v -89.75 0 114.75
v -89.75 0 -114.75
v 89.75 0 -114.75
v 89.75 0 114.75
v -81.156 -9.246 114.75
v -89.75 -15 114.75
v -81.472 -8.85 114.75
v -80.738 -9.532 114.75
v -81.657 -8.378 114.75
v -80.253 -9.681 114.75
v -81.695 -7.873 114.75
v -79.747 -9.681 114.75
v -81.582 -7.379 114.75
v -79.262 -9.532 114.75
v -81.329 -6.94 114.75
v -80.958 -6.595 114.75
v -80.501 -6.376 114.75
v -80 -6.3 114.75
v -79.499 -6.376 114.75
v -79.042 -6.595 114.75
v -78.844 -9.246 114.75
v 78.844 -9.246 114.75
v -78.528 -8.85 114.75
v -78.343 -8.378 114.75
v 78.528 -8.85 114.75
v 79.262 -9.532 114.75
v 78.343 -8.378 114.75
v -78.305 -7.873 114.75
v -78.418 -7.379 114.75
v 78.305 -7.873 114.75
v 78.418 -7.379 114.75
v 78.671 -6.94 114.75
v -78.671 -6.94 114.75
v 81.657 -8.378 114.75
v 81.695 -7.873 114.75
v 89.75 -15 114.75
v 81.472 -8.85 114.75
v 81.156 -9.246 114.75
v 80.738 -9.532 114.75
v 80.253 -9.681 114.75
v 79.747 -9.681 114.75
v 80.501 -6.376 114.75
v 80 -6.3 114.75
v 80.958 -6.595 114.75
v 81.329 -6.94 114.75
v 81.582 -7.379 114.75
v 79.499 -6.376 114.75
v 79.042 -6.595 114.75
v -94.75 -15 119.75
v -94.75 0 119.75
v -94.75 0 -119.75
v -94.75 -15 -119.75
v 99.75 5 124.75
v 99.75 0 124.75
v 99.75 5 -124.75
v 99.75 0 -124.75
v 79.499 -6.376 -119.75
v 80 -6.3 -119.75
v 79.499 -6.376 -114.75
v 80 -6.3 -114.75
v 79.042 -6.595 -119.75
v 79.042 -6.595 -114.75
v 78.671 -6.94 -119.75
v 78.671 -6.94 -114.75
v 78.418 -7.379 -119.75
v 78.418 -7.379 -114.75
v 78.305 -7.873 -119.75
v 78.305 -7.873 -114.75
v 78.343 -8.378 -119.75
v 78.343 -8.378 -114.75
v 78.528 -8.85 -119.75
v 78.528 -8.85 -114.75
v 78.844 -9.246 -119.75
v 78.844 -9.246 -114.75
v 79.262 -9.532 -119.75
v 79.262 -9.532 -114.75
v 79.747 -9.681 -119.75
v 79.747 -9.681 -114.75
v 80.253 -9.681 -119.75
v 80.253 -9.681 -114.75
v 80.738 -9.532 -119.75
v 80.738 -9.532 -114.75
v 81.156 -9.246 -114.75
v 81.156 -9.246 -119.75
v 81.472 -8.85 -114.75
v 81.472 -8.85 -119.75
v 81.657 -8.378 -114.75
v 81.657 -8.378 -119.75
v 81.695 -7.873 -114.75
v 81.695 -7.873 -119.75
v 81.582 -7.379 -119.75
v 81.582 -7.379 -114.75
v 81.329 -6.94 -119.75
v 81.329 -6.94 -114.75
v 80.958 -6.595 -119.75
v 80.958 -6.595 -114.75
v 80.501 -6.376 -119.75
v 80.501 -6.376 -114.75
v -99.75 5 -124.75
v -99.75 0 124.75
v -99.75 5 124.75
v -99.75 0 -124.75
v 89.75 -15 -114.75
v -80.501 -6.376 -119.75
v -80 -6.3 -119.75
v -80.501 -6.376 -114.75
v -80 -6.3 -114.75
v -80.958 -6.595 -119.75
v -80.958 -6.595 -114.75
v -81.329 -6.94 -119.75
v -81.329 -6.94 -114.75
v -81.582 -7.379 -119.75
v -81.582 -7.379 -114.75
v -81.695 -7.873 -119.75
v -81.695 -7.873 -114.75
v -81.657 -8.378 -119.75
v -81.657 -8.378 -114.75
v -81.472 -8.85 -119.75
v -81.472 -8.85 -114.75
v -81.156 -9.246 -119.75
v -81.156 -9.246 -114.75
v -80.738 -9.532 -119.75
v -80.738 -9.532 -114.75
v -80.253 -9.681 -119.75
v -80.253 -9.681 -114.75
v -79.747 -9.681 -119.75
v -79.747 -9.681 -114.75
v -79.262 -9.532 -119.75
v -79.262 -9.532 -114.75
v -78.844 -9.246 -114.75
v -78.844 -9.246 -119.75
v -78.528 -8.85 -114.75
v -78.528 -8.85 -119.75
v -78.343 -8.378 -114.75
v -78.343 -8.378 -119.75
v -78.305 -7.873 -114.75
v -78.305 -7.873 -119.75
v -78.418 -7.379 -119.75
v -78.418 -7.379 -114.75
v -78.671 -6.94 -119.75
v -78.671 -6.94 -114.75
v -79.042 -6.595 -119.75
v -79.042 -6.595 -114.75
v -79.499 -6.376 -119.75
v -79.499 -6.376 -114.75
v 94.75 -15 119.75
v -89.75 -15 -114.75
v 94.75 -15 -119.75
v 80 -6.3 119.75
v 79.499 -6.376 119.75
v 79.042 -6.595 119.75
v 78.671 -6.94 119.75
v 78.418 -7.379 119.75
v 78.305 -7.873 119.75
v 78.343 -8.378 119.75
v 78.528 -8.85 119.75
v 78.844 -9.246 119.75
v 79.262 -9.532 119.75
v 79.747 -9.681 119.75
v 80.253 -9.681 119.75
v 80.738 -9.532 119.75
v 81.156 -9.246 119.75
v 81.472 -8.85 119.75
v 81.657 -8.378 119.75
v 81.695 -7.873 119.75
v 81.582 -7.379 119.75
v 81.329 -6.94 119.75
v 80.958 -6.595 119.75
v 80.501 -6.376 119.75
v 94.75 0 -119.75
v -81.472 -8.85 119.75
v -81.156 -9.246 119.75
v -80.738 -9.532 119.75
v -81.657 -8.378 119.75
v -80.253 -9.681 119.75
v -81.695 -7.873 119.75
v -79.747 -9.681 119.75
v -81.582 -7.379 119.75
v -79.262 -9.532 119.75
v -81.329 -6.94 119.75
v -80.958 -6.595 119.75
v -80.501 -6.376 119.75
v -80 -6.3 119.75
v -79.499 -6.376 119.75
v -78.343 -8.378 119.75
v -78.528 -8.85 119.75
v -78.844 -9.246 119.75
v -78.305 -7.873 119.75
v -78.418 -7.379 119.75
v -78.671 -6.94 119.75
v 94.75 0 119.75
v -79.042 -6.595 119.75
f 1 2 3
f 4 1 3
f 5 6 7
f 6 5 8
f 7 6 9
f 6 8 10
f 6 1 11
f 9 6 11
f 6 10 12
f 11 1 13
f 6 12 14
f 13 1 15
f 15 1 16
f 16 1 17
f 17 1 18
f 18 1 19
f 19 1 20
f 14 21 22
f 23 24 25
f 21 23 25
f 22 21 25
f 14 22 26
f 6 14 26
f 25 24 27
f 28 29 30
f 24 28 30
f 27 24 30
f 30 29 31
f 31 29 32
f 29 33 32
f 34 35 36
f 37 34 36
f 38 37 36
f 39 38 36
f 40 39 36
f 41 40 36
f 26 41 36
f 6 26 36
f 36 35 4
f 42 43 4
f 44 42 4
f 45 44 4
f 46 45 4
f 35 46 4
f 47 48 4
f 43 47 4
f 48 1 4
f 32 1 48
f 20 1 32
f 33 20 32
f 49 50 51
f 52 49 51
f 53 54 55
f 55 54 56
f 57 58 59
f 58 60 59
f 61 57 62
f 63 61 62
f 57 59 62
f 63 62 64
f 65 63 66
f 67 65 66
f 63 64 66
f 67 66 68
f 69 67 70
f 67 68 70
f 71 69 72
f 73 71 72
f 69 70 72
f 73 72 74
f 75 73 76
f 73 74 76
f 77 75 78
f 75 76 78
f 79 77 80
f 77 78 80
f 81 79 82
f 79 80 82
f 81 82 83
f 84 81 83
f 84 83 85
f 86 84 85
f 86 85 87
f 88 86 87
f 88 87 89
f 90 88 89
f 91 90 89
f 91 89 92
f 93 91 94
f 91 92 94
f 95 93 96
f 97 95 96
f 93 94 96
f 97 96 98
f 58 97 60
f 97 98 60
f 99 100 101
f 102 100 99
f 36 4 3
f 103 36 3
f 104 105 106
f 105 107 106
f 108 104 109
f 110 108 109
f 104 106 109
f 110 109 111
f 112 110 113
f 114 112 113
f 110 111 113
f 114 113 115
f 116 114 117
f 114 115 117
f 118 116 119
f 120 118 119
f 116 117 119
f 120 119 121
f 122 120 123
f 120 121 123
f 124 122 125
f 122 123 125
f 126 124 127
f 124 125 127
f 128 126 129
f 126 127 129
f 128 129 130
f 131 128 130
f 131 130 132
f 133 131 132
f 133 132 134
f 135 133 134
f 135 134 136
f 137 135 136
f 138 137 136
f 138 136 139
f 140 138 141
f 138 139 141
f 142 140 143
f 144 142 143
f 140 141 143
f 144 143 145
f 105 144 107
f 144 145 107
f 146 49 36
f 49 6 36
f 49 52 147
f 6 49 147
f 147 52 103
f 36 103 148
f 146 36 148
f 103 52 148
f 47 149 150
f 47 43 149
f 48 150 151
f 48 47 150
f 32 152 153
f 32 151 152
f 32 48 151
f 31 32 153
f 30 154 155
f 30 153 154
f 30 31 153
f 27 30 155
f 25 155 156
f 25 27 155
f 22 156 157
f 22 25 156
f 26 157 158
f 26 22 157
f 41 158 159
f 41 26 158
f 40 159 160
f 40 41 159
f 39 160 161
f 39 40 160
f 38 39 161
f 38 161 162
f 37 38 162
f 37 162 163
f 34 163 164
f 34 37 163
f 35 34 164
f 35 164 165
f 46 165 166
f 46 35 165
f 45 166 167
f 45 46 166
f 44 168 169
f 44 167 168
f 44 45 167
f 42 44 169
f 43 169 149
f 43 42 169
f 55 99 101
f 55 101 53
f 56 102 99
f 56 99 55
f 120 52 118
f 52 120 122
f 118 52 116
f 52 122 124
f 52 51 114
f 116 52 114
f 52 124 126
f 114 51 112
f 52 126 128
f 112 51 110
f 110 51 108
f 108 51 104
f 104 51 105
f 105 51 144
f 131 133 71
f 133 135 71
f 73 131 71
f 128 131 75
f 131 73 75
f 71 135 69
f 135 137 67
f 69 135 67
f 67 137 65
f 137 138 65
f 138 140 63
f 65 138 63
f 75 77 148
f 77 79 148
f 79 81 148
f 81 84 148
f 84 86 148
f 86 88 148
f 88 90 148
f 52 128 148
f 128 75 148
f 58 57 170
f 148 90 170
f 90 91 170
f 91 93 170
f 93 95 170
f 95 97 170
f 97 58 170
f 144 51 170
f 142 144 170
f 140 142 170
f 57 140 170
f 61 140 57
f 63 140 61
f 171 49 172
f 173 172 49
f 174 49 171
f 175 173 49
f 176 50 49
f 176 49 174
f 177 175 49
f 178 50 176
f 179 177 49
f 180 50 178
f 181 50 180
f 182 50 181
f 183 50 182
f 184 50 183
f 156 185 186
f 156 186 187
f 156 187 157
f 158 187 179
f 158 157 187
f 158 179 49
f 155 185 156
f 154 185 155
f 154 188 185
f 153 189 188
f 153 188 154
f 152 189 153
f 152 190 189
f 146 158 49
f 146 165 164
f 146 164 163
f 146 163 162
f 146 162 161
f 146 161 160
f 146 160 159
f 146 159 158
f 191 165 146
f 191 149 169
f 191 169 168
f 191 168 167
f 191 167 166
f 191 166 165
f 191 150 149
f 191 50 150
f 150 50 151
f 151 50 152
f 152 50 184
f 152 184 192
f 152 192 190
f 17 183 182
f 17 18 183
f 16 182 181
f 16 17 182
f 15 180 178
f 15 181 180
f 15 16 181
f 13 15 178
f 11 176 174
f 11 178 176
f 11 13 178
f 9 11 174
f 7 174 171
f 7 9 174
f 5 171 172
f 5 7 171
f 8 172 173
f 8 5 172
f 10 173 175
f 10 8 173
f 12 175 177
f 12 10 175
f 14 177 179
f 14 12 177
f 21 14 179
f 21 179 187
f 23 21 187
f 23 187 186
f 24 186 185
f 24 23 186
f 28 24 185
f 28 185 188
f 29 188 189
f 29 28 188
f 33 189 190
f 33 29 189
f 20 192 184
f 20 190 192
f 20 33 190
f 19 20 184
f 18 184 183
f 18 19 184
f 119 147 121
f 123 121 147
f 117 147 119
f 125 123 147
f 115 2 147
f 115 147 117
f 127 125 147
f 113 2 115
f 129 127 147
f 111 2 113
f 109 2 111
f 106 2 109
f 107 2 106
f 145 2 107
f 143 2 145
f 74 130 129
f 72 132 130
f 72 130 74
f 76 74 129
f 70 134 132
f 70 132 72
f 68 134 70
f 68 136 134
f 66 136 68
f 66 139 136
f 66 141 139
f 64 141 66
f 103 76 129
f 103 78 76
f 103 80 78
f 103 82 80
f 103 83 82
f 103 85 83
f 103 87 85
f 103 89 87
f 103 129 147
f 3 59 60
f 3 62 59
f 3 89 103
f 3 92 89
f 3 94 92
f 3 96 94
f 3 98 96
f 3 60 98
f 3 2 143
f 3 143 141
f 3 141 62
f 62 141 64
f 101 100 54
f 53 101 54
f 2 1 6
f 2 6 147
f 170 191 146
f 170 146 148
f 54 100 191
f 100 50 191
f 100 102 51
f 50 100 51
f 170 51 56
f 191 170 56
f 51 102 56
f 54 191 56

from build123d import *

# Parameters (mm, degrees)
SKETCH1_W                     = 199.5
SKETCH1_H                     = 249.5
BOSS_EXTRUDE1_DEPTH           = 5
SKETCH1_3_W                   = 189.5
SKETCH1_3_H                   = 239.5
SKETCH1_3_W_2                 = 179.5
SKETCH1_3_H_2                 = 229.5
BOSS_EXTRUDE2_DEPTH           = 15
M3_CLEARANCE_HOLE1_AT_2_COUNT = 2
M3_CLEARANCE_HOLE1_AT_2_PITCH = 160


with BuildPart() as part:
    # Sketch1 → Boss-Extrude1 (new body)
    with BuildSketch(Plane(origin=(0, 0, 0), x_dir=(1, 0, 0), z_dir=(0, 1, 0))):
        Rectangle(SKETCH1_W, SKETCH1_H)
    extrude(amount=BOSS_EXTRUDE1_DEPTH)

    # Sketch1<3> → Boss-Extrude2 (add)
    with BuildSketch(Plane(origin=(0, 0, 0), x_dir=(1, 0, 0), z_dir=(0, 1, 0))):
        Rectangle(SKETCH1_3_W, SKETCH1_3_H)
        Rectangle(SKETCH1_3_W_2, SKETCH1_3_H_2, mode=Mode.SUBTRACT)
    extrude(amount=-BOSS_EXTRUDE2_DEPTH)

    # Sketch4 → M3 Clearance Hole1 (revolve, cut)
    with BuildSketch(Plane(origin=(-80, -8, 0), x_dir=(0, 1, 0), z_dir=(1, 0, 0))):
        Polygon((0, 0), (0, 124.75), (1.7, 124.75), (1.7, 0.025), (1.725, 0), align=None)
    m3_clearance_hole1 = revolve(axis=Axis((-80, -8, -6.35), (0, 0, 1)), mode=Mode.SUBTRACT)

    # M3 Clearance Hole1 at 2: M3 Clearance Hole1 ×2
    with Locations(*[(i * M3_CLEARANCE_HOLE1_AT_2_PITCH, 0, 0) for i in range(1, M3_CLEARANCE_HOLE1_AT_2_COUNT)]):
        add(m3_clearance_hole1, mode=Mode.SUBTRACT)

    # Mirror1: M3 Clearance Hole1 across plane
    add(m3_clearance_hole1.mirror(Plane.XY), mode=Mode.SUBTRACT)

    # Mirror1 copy 1 sketch → Mirror1 copy 1 (revolve, cut)
    with BuildSketch(Plane(origin=(80, -8, 0), x_dir=(0, 1, 0), z_dir=(1, 0, 0))):
        Polygon((0, 0), (0, -124.75), (1.7, -124.75), (1.7, -0.025), (1.725, 0), align=None)
    revolve(axis=Axis((80, -8, 6.35), (0, 0, 1)), mode=Mode.SUBTRACT)


solid = part.part
